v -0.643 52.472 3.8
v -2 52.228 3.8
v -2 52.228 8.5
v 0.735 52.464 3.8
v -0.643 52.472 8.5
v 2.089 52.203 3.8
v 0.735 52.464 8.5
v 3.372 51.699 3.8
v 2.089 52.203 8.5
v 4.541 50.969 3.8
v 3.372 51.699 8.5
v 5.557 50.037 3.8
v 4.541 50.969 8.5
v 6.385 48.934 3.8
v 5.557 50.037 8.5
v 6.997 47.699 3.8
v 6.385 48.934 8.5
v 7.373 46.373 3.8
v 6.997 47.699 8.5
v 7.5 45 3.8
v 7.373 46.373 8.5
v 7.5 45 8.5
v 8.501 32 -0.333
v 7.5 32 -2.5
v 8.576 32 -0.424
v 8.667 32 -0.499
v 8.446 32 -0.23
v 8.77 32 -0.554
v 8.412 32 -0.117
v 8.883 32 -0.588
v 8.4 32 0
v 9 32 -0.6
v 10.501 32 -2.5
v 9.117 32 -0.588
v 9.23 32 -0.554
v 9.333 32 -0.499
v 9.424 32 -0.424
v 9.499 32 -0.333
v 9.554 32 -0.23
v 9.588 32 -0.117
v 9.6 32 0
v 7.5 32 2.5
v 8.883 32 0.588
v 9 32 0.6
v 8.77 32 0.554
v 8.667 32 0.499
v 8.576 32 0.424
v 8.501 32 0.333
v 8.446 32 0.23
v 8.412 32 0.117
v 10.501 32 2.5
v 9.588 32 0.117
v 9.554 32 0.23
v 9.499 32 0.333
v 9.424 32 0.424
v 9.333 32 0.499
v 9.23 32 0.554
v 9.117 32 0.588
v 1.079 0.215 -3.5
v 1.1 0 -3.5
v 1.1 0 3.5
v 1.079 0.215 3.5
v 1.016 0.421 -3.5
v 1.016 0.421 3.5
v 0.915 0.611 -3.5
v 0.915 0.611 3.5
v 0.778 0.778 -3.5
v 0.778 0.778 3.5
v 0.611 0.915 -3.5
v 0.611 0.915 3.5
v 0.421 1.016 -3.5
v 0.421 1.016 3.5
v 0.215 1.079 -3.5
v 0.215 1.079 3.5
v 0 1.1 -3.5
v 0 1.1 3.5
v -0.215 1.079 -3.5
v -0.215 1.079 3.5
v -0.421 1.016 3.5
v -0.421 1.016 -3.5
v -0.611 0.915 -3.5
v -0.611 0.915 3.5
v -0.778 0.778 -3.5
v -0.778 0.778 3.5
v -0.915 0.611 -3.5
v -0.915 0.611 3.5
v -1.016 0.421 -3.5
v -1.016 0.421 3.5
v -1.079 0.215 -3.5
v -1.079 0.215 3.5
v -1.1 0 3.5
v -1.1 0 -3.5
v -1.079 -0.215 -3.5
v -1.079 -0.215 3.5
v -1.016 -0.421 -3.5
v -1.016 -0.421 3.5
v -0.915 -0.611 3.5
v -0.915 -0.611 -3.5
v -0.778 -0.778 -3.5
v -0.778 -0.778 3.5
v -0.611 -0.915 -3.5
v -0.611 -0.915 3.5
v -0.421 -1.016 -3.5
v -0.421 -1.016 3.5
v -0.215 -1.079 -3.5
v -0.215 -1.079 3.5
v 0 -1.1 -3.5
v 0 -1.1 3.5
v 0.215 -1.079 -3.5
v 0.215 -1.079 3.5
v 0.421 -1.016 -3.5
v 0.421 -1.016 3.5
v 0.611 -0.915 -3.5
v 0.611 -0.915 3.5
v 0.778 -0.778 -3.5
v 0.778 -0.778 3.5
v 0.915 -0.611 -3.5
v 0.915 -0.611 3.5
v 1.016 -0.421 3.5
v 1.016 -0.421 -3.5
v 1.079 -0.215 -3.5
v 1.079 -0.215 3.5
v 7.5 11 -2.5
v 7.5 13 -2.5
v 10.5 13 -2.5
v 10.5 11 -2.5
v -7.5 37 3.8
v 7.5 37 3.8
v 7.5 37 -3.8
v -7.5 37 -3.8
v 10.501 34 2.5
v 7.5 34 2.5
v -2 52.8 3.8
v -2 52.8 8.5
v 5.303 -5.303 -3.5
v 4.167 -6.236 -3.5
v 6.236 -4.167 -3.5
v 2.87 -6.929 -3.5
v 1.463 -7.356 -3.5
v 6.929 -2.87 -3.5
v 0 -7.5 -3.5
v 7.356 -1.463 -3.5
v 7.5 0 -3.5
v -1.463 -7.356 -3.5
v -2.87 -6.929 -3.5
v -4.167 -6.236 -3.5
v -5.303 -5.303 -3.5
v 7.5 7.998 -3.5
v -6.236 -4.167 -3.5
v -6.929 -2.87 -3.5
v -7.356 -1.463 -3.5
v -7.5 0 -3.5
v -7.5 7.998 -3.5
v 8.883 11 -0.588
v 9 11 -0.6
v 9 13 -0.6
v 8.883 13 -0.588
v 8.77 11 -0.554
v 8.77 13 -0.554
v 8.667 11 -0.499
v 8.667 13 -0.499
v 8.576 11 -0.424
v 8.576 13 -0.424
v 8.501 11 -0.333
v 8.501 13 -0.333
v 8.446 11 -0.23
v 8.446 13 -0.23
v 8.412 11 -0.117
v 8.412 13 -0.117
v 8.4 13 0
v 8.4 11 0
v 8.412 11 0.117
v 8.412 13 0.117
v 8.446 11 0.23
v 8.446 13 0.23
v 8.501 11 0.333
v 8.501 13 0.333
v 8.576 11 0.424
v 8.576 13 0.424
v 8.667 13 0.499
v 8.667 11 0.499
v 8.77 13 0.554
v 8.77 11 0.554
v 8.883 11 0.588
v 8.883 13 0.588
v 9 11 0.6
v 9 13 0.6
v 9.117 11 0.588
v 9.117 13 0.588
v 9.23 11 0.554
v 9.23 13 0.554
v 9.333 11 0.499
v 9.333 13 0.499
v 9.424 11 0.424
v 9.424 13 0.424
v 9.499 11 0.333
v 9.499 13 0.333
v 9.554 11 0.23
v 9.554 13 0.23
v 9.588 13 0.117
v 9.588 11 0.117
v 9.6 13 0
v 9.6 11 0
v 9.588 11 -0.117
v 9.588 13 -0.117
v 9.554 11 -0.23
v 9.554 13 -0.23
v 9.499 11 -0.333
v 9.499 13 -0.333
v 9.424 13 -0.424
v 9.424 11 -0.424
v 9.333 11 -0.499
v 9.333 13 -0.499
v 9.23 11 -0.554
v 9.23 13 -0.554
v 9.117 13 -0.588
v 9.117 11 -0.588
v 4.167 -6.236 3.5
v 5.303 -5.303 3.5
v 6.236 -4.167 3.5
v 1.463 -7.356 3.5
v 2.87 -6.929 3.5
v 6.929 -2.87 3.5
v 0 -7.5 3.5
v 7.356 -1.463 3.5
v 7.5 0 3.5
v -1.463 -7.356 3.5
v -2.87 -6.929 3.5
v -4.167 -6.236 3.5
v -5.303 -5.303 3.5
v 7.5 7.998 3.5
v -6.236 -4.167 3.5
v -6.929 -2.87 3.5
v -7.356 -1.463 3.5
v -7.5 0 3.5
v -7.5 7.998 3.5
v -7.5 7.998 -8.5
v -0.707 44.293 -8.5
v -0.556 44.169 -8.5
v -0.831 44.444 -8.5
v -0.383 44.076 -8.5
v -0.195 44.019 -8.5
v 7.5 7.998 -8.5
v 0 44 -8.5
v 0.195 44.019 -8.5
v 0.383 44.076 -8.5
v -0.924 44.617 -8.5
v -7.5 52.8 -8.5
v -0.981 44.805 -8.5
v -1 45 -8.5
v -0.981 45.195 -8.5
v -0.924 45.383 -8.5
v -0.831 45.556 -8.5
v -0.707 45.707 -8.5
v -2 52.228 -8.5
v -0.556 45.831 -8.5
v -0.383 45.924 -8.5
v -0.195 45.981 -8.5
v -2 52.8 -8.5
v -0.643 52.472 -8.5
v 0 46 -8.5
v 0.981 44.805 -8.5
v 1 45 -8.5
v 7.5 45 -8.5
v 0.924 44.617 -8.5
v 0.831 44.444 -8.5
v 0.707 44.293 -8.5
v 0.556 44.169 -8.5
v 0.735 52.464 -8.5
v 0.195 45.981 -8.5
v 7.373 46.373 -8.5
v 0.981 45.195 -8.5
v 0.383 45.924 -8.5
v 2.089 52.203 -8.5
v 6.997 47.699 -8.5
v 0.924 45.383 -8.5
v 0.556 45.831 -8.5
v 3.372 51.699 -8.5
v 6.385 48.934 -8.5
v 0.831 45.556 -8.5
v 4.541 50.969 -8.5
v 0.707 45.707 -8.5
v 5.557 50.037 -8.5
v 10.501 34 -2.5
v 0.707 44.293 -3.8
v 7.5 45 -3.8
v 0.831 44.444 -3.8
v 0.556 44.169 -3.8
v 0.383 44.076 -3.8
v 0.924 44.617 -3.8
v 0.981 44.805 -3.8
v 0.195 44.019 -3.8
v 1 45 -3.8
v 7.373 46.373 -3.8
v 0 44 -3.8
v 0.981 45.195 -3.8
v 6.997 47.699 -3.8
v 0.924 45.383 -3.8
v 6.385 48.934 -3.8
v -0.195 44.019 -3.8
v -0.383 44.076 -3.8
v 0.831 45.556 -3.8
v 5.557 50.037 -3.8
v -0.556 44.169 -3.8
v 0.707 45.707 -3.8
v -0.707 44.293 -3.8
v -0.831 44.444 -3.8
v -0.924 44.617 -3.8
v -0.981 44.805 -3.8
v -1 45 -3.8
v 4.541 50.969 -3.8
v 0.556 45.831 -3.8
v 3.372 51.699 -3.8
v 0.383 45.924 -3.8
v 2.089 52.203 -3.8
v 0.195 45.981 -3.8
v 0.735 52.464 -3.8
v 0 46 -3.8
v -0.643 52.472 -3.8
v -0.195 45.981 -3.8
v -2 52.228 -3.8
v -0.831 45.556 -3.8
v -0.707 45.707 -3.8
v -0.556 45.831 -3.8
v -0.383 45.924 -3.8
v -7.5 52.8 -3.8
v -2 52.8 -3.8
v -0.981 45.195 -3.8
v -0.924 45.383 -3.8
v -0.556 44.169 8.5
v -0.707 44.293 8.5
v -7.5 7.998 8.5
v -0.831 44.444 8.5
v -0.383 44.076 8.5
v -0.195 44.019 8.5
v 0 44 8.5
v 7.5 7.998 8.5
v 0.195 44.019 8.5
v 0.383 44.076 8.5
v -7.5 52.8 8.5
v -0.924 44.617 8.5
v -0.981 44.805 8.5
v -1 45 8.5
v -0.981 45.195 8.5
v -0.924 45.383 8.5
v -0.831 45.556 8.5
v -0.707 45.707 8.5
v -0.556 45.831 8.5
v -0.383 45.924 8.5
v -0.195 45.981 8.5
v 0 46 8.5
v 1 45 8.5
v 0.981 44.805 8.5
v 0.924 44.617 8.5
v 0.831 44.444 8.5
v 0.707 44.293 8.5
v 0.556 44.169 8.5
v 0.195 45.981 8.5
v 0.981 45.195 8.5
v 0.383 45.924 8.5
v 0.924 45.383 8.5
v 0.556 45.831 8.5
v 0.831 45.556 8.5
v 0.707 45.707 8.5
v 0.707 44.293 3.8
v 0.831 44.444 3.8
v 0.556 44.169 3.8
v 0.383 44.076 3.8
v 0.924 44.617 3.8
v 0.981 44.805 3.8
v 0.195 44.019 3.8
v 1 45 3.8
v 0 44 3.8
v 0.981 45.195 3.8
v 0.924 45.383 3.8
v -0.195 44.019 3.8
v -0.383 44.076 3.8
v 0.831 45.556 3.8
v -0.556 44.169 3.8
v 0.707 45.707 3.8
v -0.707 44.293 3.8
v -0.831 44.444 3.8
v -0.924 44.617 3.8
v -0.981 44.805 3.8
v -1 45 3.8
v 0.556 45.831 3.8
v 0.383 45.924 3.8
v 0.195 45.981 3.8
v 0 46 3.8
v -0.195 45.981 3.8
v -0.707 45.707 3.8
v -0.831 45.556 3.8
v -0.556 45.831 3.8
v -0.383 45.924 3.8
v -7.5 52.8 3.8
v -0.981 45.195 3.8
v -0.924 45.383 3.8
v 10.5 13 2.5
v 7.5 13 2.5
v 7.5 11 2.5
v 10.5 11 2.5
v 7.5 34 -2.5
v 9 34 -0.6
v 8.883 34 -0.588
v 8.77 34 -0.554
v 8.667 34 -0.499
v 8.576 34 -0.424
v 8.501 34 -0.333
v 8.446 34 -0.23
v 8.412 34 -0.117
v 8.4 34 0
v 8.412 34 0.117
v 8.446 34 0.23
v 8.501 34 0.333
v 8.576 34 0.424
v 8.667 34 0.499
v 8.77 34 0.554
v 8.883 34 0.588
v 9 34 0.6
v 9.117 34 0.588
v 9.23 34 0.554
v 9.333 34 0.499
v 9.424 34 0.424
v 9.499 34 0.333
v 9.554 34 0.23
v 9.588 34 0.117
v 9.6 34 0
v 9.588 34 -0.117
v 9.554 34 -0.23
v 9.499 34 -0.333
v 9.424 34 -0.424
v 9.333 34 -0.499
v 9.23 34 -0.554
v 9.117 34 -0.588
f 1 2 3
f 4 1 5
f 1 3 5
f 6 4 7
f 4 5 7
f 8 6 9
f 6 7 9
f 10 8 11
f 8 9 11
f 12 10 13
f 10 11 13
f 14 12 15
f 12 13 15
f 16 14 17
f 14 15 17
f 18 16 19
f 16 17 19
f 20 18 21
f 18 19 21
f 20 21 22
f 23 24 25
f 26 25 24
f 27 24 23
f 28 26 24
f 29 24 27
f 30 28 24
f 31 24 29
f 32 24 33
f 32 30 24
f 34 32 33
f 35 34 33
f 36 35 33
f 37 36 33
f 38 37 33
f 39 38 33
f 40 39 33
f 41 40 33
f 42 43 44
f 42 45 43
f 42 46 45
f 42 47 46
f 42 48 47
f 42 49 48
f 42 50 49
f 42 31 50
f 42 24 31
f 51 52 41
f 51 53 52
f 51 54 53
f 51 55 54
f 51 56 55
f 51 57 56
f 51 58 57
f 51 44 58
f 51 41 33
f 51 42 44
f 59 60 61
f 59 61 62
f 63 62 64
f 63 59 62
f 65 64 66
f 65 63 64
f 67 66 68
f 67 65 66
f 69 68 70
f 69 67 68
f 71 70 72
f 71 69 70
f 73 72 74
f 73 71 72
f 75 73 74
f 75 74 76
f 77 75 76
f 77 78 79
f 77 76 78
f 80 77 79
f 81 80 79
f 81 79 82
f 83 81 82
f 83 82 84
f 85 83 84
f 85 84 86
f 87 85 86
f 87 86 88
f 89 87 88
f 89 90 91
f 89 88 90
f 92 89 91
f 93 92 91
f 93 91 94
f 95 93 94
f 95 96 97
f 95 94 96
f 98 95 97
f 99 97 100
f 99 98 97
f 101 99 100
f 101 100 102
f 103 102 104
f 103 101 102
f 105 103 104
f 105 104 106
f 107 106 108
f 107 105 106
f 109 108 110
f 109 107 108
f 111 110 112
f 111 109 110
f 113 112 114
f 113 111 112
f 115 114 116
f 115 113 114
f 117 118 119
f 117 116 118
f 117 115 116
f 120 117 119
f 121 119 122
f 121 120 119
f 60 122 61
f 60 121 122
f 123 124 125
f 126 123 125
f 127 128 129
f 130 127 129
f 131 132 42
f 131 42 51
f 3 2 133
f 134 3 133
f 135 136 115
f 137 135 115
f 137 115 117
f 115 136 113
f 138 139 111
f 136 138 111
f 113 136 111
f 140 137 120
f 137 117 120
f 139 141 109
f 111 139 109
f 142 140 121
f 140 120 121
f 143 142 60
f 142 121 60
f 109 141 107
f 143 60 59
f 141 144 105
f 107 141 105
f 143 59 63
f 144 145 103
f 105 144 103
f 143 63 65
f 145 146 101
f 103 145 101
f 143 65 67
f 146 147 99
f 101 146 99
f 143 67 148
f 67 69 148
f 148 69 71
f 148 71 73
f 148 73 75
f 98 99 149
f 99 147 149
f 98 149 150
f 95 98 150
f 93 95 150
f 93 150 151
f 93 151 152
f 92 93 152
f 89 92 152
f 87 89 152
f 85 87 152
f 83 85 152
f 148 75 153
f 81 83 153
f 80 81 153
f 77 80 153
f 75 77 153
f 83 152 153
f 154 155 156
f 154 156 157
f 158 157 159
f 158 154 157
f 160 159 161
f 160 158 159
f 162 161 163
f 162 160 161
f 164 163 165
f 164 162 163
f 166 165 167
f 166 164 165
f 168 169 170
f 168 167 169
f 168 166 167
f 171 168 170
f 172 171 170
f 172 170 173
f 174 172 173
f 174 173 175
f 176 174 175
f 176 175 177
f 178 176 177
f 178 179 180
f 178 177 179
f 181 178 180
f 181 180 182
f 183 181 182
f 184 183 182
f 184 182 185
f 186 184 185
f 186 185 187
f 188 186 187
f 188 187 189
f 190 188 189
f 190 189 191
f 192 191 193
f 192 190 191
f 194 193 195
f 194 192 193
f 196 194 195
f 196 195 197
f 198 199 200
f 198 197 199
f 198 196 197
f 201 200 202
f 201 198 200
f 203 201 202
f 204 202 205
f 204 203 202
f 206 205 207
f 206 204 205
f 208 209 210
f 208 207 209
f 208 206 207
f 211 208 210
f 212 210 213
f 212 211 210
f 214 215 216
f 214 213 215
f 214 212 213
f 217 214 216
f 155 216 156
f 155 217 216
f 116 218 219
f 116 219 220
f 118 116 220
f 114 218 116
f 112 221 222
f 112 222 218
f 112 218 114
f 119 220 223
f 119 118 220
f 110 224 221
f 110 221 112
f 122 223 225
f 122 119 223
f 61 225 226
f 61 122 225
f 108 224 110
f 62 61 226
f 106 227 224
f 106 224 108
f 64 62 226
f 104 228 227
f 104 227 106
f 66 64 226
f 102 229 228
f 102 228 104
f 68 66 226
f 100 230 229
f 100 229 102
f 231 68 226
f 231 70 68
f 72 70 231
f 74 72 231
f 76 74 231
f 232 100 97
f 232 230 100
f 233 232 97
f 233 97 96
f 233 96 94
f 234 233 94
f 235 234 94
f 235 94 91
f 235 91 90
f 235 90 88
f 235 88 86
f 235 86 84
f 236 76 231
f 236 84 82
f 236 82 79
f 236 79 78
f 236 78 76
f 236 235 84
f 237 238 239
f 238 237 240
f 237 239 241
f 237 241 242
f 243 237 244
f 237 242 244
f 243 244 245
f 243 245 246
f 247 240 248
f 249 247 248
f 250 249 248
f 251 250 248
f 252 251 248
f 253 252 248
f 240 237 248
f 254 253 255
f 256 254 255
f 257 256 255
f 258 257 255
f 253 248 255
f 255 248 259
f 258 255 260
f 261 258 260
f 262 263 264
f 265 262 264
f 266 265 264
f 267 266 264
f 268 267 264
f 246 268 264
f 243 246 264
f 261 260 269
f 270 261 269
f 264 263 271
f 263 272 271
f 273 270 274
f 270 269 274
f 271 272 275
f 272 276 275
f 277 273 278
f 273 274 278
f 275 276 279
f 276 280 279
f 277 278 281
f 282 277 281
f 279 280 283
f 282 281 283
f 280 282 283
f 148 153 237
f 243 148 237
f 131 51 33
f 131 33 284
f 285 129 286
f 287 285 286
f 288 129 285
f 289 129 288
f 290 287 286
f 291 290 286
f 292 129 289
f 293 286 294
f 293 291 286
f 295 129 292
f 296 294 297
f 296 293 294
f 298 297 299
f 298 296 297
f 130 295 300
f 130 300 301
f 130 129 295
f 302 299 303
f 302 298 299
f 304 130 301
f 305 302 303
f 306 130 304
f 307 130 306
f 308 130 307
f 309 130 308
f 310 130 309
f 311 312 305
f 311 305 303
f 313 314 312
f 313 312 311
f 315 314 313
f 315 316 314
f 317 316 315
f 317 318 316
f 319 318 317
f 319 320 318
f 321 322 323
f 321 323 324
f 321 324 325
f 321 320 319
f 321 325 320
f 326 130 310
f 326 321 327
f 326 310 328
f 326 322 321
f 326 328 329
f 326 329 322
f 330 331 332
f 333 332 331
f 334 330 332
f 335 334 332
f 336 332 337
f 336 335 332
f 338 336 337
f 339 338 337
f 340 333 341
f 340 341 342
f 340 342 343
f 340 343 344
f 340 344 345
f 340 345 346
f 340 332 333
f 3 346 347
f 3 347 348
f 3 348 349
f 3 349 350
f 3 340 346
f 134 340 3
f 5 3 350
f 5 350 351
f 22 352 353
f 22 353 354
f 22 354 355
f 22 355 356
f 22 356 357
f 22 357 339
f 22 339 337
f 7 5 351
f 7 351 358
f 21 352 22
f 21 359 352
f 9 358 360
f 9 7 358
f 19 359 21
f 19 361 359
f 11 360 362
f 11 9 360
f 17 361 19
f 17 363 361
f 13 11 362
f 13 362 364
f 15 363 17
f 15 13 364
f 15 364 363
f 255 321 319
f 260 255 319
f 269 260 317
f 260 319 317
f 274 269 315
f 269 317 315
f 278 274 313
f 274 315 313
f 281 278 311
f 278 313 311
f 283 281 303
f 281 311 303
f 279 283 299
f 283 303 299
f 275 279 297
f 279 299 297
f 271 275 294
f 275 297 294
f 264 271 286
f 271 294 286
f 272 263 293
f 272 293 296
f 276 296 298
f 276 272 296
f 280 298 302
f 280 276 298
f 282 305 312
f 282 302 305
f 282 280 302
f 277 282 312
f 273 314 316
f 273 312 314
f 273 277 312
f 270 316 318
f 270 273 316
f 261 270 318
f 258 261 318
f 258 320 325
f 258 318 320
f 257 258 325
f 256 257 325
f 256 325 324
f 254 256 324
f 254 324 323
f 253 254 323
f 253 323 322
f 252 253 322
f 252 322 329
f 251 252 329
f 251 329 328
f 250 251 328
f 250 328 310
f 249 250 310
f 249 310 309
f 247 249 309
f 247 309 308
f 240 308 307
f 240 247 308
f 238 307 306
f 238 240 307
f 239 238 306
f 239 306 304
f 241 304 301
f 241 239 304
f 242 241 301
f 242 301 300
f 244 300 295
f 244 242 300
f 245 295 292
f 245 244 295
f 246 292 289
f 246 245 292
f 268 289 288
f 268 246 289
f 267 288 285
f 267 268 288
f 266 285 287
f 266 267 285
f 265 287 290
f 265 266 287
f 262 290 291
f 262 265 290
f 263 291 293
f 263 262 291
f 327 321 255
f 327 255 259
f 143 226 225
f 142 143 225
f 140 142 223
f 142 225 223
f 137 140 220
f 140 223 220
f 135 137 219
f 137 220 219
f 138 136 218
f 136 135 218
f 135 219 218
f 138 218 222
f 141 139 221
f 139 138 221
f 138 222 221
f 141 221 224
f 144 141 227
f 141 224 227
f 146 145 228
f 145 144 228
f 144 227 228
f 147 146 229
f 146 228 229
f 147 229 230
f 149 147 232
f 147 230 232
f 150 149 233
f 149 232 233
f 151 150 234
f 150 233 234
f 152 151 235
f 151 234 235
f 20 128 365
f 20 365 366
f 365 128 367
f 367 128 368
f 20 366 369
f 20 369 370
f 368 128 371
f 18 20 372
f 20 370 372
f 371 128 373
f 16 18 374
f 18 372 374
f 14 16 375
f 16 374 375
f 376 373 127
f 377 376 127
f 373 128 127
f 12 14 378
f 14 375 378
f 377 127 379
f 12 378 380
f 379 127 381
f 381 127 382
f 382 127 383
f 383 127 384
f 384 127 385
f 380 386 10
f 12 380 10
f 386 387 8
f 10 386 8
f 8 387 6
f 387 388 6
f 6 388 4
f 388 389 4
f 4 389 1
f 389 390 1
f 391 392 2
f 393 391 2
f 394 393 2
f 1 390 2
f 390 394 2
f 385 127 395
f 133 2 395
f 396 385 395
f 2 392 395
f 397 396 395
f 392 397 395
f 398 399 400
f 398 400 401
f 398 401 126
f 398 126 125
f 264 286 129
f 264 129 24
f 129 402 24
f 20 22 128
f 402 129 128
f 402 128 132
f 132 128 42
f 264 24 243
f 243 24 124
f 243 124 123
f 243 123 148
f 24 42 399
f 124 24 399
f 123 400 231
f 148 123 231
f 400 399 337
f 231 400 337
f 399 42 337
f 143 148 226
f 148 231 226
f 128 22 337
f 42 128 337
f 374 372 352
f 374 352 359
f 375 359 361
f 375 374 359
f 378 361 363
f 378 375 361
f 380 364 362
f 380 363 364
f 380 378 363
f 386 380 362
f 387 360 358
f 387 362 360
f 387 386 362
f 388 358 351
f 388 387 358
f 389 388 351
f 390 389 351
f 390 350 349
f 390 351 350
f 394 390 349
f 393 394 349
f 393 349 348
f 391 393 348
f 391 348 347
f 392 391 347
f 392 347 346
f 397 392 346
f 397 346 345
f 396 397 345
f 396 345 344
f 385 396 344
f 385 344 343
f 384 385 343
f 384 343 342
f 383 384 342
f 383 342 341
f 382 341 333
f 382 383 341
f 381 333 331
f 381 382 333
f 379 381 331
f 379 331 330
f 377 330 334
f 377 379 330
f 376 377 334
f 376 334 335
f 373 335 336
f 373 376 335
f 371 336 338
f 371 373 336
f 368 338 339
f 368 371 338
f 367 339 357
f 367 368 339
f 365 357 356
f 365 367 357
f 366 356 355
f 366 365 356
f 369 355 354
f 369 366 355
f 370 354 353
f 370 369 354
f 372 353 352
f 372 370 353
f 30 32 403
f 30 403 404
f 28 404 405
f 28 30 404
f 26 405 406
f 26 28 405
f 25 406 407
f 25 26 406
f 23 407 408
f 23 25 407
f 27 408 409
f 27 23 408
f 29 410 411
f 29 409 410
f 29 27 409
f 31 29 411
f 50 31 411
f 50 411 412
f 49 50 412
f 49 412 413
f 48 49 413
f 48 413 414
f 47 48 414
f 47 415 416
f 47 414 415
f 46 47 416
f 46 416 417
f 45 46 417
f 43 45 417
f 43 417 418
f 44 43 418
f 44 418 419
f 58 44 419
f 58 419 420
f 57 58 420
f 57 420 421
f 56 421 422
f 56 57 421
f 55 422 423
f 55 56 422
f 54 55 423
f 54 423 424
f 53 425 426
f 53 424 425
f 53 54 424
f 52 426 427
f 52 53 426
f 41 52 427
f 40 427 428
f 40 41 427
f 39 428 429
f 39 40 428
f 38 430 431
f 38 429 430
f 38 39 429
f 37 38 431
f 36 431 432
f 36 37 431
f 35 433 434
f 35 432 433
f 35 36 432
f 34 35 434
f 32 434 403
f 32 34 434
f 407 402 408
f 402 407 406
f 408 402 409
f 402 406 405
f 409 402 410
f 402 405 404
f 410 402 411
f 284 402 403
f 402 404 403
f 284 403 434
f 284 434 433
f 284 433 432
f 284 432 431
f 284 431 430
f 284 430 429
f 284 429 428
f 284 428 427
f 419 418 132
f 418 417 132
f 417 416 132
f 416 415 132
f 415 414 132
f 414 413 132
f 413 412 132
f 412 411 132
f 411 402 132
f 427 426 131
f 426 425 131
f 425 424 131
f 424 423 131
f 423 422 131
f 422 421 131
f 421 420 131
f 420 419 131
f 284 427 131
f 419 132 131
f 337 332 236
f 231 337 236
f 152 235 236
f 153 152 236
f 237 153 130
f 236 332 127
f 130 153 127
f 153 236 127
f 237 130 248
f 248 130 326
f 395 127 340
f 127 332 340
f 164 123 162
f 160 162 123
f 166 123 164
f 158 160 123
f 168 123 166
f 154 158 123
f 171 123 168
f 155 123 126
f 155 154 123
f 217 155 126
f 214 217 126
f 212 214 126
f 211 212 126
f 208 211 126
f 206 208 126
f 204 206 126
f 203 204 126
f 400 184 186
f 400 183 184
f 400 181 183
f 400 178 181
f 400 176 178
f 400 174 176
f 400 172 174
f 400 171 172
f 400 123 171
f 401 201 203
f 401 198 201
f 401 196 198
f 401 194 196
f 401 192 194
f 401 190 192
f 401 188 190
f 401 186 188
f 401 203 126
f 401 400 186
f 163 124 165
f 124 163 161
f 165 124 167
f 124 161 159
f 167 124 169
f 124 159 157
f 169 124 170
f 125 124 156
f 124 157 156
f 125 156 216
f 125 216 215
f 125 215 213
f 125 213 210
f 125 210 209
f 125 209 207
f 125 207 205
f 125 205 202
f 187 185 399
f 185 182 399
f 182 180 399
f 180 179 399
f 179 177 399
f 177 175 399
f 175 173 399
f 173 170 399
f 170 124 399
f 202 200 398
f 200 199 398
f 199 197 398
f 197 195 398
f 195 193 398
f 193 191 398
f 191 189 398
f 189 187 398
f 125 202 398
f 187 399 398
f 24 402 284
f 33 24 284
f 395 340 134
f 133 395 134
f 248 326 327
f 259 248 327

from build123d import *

# Parameters (mm, degrees)
LINK1_BODY_DEPTH       = 8.5
TONGUE_CUT_DEPTH       = 56.258483512
TONGUE_CUT_DEPTH_BACK  = 56.258483512
SKETCH1_W              = 5.5
SKETCH1_H              = 15.998130079
SKETCH7_W              = 5.5
SKETCH7_H              = 7.8
BOSS_EXTRUDE1_DEPTH    = 8.5
SLOT_CUT_DEPTH         = 55.003148056
SLOT_CUT_DEPTH_BACK    = 55.003148056
SKETCH2_W              = 7.6
SKETCH2_H              = 18
PIN_HOLES_DEPTH        = 55.003148056
PIN_HOLES_DEPTH_BACK   = 55.003148056
SKETCH3_R              = 1.1
SKETCH3_R_2            = 1
SKETCH4_W              = 3.5
SKETCH4_H              = 2
GUIDE_BLOCK_1_DEPTH    = 2.5
SKETCH5_W              = 3.5
SKETCH5_H              = 2
GUIDE_BLOCK_2_DEPTH    = 2.5
CORD_GUIDES_DEPTH      = 55.500938464
CORD_GUIDES_DEPTH_BACK = 55.500938464
SKETCH6_R              = 0.6


with BuildPart() as part:
    # Link1_Outline → Link1_Body (new, symmetric)
    with BuildSketch(Plane.XY):
        with BuildLine():
            Line((-7.5, 0), (-7.5, 45))
            ThreePointArc((-7.5, 45), (0, 52.5), (7.5, 45))
            Line((7.5, 45), (7.5, 0))
            ThreePointArc((7.5, 0), (0, -7.5), (-7.5, 0))
        make_face()
    extrude(amount=LINK1_BODY_DEPTH, both=True)

    # Sketch1 → Tongue_Cut (cut, two sides: drawn at the far end of the back side and taken through both)
    with BuildSketch(Plane(origin=(7.5, 0, 0), x_dir=(0, 0, -1), z_dir=(1, 0, 0)).offset(-TONGUE_CUT_DEPTH_BACK)):
        with Locations((6.25, -0.00093496)):
            Rectangle(SKETCH1_W, SKETCH1_H)
        with Locations((-6.25, -0.00093496)):
            Rectangle(SKETCH1_W, SKETCH1_H)
    extrude(amount=TONGUE_CUT_DEPTH + TONGUE_CUT_DEPTH_BACK, mode=Mode.SUBTRACT)

    # Sketch7 → Boss-Extrude1 (add, symmetric)
    with BuildSketch(Plane.XY):
        with Locations((-4.75, 48.9)):
            Rectangle(SKETCH7_W, SKETCH7_H)
    extrude(amount=BOSS_EXTRUDE1_DEPTH, both=True)

    # Sketch2 → Slot_Cut (cut, two sides: drawn at the far end of the back side and taken through both)
    with BuildSketch(Plane(origin=(0, 0, 0), x_dir=(0, 0, -1), z_dir=(1, 0, 0)).offset(-SLOT_CUT_DEPTH_BACK)):
        with Locations((0, 46)):
            Rectangle(SKETCH2_W, SKETCH2_H)
    extrude(amount=SLOT_CUT_DEPTH + SLOT_CUT_DEPTH_BACK, mode=Mode.SUBTRACT)

    # Sketch3 → Pin_Holes (cut, two sides: drawn at the far end of the back side and taken through both)
    with BuildSketch(Plane.XY.offset(-PIN_HOLES_DEPTH_BACK)):
        Circle(SKETCH3_R)
        with Locations((0, 45)):
            Circle(SKETCH3_R_2)
    extrude(amount=PIN_HOLES_DEPTH + PIN_HOLES_DEPTH_BACK, mode=Mode.SUBTRACT)

    # Sketch4 → Guide_Block_1 (add, symmetric)
    with BuildSketch(Plane.XY):
        with Locations((8.75, 12)):
            Rectangle(SKETCH4_W, SKETCH4_H)
    extrude(amount=GUIDE_BLOCK_1_DEPTH, both=True)

    # Sketch5 → Guide_Block_2 (add, symmetric)
    with BuildSketch(Plane.XY):
        with Locations((8.750585387, 33)):
            Rectangle(SKETCH5_W, SKETCH5_H)
    extrude(amount=GUIDE_BLOCK_2_DEPTH, both=True)

    # Sketch6 → Cord_Guides (cut, two sides: drawn at the far end of the back side and taken through both)
    with BuildSketch(Plane(origin=(0, 0, 0), x_dir=(1, 0, 0), z_dir=(0, 1, 0)).offset(-CORD_GUIDES_DEPTH_BACK)):
        with Locations(Location((9, 0, 0), (0, 0, 90))):
            Circle(SKETCH6_R)
    extrude(amount=CORD_GUIDES_DEPTH + CORD_GUIDES_DEPTH_BACK, mode=Mode.SUBTRACT)


solid = part.part
